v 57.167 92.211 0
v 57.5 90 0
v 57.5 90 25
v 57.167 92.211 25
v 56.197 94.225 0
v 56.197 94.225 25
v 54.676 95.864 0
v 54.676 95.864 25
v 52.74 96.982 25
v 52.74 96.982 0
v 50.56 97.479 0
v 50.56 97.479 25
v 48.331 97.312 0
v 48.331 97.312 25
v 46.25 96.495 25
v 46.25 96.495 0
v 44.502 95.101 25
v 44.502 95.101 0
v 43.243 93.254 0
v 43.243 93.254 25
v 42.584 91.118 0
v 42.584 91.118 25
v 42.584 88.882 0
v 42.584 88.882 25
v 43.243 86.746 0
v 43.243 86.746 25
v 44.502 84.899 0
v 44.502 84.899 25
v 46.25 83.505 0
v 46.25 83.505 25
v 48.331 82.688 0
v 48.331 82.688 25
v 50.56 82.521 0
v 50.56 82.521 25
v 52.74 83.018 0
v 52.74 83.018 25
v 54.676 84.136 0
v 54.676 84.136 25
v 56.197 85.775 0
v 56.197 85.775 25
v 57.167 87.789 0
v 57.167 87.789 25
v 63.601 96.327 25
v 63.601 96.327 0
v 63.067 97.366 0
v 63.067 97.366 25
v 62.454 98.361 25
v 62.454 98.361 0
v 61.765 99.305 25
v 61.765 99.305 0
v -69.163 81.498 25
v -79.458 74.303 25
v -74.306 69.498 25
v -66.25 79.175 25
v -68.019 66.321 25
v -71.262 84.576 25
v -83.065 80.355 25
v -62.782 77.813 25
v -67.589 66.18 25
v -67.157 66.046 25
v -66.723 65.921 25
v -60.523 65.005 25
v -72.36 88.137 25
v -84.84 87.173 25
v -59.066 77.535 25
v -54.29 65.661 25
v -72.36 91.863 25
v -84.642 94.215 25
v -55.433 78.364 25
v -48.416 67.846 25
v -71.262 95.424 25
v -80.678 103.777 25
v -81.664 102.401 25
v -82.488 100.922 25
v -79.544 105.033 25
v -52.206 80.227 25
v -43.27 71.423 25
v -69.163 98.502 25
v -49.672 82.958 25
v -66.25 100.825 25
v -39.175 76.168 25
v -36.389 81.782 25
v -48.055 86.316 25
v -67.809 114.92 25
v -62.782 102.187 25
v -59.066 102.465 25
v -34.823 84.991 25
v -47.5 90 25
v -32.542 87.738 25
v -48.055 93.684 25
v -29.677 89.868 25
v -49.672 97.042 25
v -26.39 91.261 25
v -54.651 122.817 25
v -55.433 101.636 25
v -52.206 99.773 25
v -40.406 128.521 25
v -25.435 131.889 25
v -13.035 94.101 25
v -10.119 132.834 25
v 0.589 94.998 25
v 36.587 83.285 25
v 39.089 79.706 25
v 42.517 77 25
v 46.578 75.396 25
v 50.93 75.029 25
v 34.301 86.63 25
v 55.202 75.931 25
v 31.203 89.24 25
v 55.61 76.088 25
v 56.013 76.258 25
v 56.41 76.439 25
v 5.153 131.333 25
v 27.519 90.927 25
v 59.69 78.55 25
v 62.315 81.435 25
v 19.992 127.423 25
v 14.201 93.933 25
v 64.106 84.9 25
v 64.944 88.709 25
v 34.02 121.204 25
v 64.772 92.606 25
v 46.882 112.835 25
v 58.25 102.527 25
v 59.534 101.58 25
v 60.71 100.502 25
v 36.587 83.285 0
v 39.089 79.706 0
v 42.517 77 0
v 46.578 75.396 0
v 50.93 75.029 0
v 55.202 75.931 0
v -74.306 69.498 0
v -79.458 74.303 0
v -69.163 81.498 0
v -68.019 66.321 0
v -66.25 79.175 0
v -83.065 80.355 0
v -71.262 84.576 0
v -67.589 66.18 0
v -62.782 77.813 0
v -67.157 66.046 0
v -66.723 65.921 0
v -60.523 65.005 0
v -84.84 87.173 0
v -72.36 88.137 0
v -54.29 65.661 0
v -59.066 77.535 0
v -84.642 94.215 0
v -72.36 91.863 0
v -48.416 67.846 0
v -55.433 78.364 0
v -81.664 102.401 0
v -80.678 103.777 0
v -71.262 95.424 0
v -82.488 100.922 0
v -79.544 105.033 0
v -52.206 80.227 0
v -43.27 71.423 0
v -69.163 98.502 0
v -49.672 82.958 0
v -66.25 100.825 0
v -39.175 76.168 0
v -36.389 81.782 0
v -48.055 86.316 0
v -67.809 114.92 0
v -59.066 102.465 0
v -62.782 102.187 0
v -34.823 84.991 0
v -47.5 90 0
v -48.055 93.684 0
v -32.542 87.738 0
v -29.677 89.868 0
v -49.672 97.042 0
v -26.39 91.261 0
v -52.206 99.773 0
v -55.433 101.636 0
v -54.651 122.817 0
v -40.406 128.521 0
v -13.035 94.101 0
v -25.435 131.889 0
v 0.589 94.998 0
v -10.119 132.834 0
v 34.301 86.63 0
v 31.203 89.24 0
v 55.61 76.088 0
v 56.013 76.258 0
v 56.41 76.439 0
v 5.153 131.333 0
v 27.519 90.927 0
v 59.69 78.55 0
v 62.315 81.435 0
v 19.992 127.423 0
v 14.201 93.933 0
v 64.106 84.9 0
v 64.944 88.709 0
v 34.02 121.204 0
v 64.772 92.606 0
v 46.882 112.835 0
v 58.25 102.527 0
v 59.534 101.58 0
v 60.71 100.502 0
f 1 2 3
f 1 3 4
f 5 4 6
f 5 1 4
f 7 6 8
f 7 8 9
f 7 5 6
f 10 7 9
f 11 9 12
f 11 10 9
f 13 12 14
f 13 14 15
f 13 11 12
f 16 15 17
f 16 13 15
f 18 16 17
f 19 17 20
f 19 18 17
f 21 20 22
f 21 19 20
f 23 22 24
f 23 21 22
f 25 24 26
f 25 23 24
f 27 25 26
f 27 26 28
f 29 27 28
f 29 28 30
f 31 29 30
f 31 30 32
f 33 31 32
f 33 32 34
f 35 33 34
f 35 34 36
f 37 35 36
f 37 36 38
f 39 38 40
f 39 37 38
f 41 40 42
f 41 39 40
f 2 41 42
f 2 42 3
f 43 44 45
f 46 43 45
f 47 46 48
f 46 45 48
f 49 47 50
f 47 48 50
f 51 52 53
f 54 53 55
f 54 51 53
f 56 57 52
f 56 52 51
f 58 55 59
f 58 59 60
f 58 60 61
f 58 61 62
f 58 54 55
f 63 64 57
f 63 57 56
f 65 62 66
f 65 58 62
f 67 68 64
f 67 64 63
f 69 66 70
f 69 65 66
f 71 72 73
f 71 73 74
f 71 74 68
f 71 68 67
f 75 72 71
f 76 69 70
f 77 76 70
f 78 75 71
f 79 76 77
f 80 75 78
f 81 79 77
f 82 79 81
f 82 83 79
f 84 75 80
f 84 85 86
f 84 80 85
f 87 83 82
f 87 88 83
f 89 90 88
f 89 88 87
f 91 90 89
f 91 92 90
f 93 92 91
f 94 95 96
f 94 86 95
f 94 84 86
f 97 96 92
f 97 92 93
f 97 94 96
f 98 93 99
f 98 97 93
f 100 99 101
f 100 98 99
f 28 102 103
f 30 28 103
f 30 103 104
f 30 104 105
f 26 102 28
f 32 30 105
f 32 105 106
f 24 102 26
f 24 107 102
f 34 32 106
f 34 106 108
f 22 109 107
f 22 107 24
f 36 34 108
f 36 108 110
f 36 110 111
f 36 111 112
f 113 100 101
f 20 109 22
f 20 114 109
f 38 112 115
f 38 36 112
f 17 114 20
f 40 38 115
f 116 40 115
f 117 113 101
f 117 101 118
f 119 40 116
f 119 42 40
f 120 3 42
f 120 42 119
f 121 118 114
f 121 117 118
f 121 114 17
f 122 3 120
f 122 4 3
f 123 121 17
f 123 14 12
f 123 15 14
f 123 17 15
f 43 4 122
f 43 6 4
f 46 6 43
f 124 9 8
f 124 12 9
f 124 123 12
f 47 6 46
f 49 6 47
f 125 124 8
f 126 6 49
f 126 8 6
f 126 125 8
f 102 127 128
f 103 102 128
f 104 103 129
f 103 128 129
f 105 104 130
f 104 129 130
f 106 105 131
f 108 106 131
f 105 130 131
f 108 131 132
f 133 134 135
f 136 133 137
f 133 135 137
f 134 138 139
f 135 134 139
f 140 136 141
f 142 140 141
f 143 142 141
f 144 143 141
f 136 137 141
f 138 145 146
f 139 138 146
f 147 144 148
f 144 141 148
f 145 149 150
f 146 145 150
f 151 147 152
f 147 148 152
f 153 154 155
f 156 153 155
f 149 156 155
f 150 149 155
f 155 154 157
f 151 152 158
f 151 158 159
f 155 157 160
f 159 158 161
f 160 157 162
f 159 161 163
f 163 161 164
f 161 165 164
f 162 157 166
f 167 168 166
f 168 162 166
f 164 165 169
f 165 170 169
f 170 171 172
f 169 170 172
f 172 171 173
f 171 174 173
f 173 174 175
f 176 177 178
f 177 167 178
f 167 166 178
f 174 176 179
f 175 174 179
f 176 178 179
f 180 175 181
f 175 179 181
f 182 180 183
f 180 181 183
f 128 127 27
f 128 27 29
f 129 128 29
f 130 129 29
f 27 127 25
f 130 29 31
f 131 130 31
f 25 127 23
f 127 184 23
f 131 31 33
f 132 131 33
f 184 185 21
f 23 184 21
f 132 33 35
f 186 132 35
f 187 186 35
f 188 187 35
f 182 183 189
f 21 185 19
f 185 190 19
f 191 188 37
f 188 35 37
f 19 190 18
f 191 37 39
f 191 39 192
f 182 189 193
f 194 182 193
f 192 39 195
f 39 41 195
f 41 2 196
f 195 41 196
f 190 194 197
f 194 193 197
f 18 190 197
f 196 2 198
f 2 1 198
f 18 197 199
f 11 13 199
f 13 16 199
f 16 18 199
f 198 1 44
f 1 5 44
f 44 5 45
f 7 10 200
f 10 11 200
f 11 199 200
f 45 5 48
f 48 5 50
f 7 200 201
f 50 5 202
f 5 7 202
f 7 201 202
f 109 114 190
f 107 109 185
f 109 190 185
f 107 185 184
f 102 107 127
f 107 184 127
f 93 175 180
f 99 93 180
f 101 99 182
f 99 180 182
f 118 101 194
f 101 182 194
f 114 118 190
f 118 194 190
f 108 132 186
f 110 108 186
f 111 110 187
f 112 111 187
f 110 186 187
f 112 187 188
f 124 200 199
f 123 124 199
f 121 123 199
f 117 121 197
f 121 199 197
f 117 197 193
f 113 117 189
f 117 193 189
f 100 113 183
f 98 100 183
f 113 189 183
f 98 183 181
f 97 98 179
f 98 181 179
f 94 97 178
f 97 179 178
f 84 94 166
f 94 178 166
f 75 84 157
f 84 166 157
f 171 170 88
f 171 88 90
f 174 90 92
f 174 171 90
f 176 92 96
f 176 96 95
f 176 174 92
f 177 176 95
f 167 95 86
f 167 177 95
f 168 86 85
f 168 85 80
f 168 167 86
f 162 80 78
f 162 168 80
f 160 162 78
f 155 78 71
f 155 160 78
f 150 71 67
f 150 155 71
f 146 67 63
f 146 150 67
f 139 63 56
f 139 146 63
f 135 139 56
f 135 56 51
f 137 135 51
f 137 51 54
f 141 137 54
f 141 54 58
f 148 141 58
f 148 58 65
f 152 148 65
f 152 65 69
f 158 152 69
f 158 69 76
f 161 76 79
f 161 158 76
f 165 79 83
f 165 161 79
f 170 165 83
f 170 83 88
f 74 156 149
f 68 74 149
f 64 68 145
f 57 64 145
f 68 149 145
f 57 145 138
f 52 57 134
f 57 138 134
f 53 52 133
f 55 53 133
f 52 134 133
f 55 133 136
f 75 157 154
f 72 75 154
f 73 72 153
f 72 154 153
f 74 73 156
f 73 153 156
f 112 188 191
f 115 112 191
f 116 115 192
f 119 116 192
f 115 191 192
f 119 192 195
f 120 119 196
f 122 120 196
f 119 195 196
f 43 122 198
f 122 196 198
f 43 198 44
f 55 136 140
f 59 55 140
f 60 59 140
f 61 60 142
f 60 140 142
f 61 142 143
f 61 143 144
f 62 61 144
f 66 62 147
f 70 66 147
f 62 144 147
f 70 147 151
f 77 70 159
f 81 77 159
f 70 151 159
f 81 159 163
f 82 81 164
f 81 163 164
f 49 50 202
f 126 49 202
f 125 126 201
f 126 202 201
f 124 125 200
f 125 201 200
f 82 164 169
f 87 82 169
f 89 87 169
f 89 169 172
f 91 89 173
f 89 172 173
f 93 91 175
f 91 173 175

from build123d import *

# Parameters (mm, degrees)
F0_R     = 12.5
F0_R_2   = 7.5
F1_DEPTH = 25


with BuildPart() as f1:
    # F0 (on Top) → F1 (new body)
    with BuildSketch(Plane.XY):
        with BuildLine():
            ThreePointArc((-79.5439328464, 105.0329916801), (-81.1903795815, 103.1025246973), (-82.4879081903, 100.9221785934))
            ThreePointArc((-82.4879081903, 100.9221785934), (-83.0645935002, 80.3550776743), (-68.0186809889, 66.3208793407))
            ThreePointArc((-68.0186809889, 66.3208793407), (-67.296498316, 67.0535704822), (-66.5664236158, 67.7783980852))
            ThreePointArc((-66.5664236158, 67.7783980852), (-66.6515105536, 66.8502006193), (-66.7226044544, 65.9208266473))
            ThreePointArc((-66.7226044544, 65.9208266473), (-48.415623534, 67.8459434438), (-36.3892582797, 81.7821611469))
            ThreePointArc((-36.3892582797, 81.7821611469), (-32.5421815269, 87.7377169865), (-26.3895907314, 91.2611061791))
            ThreePointArc((-26.3895907314, 91.2611061791), (0.5889591855, 94.9981743355), (27.5190997352, 90.926889036))
            ThreePointArc((27.5190997352, 90.926889036), (32.8402812409, 88.0400857367), (36.5869893622, 83.2850059099))
            ThreePointArc((36.5869893622, 83.2850059099), (44.4886785219, 76.049181545), (55.2022156282, 75.9309931922))
            ThreePointArc((55.2022156282, 75.9309931922), (54.9958309784, 76.7755396556), (54.7775992327, 77.6171026405))
            ThreePointArc((54.7775992327, 77.6171026405), (55.5970680513, 77.0322401602), (56.4102927908, 76.4387262274))
            ThreePointArc((56.4102927908, 76.4387262274), (64.1063809456, 84.8999983709), (63.6005239797, 96.3265905096))
            ThreePointArc((63.6005239797, 96.3265905096), (61.3548283708, 99.0601930849), (59.0101731037, 101.7094049462))
            ThreePointArc((59.0101731037, 101.7094049462), (58.1789475446, 102.4000301137), (57.3401107186, 103.0813903939))
            ThreePointArc((57.3401107186, 103.0813903939), (57.8001000902, 102.8124329689), (58.2502464871, 102.5273074881))
            ThreePointArc((58.2502464871, 102.5273074881), (-10.1185209211, 132.8339833721), (-79.5439328464, 105.0329916801))
        make_face()
        with Locations((-60, 90)):
            Circle(F0_R, mode=Mode.SUBTRACT)
        with Locations((50, 90)):
            Circle(F0_R_2, mode=Mode.SUBTRACT)
        with BuildLine():
            ThreePointArc((-66.5664236158, 67.7783980852), (-67.296498316, 67.0535704822), (-68.0186809889, 66.3208793407))
            ThreePointArc((-68.0186809889, 66.3208793407), (-67.3733564047, 66.1120613001), (-66.7226044544, 65.9208266473))
            ThreePointArc((-66.7226044544, 65.9208266473), (-66.6515105536, 66.8502006193), (-66.5664236158, 67.7783980852))
        make_face()
        with BuildLine():
            ThreePointArc((59.0101731037, 101.7094049462), (58.6313959204, 102.1194582653), (58.2502464871, 102.5273074881))
            ThreePointArc((58.2502464871, 102.5273074881), (57.8001000902, 102.8124329689), (57.3401107186, 103.0813903939))
            ThreePointArc((57.3401107186, 103.0813903939), (58.1789475446, 102.4000301137), (59.0101731037, 101.7094049462))
        make_face()
        with BuildLine():
            ThreePointArc((61.7653971487, 99.3045918735), (60.1367140397, 101.056537816), (58.2502464871, 102.5273074881))
            ThreePointArc((58.2502464871, 102.5273074881), (58.6313959204, 102.1194582653), (59.0101731037, 101.7094049462))
            ThreePointArc((59.0101731037, 101.7094049462), (60.3990725447, 100.5199305447), (61.7653971487, 99.3045918736))
        make_face()
        with BuildLine():
            ThreePointArc((63.6005239797, 96.3265905096), (62.7700670204, 97.8692685998), (61.7653971487, 99.3045918735))
            ThreePointArc((61.7653971487, 99.3045918736), (60.3990725447, 100.5199305447), (59.0101731037, 101.7094049462))
            ThreePointArc((59.0101731037, 101.7094049462), (61.3548283708, 99.0601930849), (63.6005239797, 96.3265905096))
        make_face()
        with BuildLine():
            ThreePointArc((55.2022156282, 75.9309931922), (55.8118014552, 76.1716608428), (56.4102927908, 76.4387262274))
            ThreePointArc((56.4102927908, 76.4387262274), (55.5970680513, 77.0322401602), (54.7775992327, 77.6171026405))
            ThreePointArc((54.7775992327, 77.6171026405), (54.9958309784, 76.7755396556), (55.2022156282, 75.9309931922))
        make_face()
    extrude(amount=F1_DEPTH)


solid = f1.part
